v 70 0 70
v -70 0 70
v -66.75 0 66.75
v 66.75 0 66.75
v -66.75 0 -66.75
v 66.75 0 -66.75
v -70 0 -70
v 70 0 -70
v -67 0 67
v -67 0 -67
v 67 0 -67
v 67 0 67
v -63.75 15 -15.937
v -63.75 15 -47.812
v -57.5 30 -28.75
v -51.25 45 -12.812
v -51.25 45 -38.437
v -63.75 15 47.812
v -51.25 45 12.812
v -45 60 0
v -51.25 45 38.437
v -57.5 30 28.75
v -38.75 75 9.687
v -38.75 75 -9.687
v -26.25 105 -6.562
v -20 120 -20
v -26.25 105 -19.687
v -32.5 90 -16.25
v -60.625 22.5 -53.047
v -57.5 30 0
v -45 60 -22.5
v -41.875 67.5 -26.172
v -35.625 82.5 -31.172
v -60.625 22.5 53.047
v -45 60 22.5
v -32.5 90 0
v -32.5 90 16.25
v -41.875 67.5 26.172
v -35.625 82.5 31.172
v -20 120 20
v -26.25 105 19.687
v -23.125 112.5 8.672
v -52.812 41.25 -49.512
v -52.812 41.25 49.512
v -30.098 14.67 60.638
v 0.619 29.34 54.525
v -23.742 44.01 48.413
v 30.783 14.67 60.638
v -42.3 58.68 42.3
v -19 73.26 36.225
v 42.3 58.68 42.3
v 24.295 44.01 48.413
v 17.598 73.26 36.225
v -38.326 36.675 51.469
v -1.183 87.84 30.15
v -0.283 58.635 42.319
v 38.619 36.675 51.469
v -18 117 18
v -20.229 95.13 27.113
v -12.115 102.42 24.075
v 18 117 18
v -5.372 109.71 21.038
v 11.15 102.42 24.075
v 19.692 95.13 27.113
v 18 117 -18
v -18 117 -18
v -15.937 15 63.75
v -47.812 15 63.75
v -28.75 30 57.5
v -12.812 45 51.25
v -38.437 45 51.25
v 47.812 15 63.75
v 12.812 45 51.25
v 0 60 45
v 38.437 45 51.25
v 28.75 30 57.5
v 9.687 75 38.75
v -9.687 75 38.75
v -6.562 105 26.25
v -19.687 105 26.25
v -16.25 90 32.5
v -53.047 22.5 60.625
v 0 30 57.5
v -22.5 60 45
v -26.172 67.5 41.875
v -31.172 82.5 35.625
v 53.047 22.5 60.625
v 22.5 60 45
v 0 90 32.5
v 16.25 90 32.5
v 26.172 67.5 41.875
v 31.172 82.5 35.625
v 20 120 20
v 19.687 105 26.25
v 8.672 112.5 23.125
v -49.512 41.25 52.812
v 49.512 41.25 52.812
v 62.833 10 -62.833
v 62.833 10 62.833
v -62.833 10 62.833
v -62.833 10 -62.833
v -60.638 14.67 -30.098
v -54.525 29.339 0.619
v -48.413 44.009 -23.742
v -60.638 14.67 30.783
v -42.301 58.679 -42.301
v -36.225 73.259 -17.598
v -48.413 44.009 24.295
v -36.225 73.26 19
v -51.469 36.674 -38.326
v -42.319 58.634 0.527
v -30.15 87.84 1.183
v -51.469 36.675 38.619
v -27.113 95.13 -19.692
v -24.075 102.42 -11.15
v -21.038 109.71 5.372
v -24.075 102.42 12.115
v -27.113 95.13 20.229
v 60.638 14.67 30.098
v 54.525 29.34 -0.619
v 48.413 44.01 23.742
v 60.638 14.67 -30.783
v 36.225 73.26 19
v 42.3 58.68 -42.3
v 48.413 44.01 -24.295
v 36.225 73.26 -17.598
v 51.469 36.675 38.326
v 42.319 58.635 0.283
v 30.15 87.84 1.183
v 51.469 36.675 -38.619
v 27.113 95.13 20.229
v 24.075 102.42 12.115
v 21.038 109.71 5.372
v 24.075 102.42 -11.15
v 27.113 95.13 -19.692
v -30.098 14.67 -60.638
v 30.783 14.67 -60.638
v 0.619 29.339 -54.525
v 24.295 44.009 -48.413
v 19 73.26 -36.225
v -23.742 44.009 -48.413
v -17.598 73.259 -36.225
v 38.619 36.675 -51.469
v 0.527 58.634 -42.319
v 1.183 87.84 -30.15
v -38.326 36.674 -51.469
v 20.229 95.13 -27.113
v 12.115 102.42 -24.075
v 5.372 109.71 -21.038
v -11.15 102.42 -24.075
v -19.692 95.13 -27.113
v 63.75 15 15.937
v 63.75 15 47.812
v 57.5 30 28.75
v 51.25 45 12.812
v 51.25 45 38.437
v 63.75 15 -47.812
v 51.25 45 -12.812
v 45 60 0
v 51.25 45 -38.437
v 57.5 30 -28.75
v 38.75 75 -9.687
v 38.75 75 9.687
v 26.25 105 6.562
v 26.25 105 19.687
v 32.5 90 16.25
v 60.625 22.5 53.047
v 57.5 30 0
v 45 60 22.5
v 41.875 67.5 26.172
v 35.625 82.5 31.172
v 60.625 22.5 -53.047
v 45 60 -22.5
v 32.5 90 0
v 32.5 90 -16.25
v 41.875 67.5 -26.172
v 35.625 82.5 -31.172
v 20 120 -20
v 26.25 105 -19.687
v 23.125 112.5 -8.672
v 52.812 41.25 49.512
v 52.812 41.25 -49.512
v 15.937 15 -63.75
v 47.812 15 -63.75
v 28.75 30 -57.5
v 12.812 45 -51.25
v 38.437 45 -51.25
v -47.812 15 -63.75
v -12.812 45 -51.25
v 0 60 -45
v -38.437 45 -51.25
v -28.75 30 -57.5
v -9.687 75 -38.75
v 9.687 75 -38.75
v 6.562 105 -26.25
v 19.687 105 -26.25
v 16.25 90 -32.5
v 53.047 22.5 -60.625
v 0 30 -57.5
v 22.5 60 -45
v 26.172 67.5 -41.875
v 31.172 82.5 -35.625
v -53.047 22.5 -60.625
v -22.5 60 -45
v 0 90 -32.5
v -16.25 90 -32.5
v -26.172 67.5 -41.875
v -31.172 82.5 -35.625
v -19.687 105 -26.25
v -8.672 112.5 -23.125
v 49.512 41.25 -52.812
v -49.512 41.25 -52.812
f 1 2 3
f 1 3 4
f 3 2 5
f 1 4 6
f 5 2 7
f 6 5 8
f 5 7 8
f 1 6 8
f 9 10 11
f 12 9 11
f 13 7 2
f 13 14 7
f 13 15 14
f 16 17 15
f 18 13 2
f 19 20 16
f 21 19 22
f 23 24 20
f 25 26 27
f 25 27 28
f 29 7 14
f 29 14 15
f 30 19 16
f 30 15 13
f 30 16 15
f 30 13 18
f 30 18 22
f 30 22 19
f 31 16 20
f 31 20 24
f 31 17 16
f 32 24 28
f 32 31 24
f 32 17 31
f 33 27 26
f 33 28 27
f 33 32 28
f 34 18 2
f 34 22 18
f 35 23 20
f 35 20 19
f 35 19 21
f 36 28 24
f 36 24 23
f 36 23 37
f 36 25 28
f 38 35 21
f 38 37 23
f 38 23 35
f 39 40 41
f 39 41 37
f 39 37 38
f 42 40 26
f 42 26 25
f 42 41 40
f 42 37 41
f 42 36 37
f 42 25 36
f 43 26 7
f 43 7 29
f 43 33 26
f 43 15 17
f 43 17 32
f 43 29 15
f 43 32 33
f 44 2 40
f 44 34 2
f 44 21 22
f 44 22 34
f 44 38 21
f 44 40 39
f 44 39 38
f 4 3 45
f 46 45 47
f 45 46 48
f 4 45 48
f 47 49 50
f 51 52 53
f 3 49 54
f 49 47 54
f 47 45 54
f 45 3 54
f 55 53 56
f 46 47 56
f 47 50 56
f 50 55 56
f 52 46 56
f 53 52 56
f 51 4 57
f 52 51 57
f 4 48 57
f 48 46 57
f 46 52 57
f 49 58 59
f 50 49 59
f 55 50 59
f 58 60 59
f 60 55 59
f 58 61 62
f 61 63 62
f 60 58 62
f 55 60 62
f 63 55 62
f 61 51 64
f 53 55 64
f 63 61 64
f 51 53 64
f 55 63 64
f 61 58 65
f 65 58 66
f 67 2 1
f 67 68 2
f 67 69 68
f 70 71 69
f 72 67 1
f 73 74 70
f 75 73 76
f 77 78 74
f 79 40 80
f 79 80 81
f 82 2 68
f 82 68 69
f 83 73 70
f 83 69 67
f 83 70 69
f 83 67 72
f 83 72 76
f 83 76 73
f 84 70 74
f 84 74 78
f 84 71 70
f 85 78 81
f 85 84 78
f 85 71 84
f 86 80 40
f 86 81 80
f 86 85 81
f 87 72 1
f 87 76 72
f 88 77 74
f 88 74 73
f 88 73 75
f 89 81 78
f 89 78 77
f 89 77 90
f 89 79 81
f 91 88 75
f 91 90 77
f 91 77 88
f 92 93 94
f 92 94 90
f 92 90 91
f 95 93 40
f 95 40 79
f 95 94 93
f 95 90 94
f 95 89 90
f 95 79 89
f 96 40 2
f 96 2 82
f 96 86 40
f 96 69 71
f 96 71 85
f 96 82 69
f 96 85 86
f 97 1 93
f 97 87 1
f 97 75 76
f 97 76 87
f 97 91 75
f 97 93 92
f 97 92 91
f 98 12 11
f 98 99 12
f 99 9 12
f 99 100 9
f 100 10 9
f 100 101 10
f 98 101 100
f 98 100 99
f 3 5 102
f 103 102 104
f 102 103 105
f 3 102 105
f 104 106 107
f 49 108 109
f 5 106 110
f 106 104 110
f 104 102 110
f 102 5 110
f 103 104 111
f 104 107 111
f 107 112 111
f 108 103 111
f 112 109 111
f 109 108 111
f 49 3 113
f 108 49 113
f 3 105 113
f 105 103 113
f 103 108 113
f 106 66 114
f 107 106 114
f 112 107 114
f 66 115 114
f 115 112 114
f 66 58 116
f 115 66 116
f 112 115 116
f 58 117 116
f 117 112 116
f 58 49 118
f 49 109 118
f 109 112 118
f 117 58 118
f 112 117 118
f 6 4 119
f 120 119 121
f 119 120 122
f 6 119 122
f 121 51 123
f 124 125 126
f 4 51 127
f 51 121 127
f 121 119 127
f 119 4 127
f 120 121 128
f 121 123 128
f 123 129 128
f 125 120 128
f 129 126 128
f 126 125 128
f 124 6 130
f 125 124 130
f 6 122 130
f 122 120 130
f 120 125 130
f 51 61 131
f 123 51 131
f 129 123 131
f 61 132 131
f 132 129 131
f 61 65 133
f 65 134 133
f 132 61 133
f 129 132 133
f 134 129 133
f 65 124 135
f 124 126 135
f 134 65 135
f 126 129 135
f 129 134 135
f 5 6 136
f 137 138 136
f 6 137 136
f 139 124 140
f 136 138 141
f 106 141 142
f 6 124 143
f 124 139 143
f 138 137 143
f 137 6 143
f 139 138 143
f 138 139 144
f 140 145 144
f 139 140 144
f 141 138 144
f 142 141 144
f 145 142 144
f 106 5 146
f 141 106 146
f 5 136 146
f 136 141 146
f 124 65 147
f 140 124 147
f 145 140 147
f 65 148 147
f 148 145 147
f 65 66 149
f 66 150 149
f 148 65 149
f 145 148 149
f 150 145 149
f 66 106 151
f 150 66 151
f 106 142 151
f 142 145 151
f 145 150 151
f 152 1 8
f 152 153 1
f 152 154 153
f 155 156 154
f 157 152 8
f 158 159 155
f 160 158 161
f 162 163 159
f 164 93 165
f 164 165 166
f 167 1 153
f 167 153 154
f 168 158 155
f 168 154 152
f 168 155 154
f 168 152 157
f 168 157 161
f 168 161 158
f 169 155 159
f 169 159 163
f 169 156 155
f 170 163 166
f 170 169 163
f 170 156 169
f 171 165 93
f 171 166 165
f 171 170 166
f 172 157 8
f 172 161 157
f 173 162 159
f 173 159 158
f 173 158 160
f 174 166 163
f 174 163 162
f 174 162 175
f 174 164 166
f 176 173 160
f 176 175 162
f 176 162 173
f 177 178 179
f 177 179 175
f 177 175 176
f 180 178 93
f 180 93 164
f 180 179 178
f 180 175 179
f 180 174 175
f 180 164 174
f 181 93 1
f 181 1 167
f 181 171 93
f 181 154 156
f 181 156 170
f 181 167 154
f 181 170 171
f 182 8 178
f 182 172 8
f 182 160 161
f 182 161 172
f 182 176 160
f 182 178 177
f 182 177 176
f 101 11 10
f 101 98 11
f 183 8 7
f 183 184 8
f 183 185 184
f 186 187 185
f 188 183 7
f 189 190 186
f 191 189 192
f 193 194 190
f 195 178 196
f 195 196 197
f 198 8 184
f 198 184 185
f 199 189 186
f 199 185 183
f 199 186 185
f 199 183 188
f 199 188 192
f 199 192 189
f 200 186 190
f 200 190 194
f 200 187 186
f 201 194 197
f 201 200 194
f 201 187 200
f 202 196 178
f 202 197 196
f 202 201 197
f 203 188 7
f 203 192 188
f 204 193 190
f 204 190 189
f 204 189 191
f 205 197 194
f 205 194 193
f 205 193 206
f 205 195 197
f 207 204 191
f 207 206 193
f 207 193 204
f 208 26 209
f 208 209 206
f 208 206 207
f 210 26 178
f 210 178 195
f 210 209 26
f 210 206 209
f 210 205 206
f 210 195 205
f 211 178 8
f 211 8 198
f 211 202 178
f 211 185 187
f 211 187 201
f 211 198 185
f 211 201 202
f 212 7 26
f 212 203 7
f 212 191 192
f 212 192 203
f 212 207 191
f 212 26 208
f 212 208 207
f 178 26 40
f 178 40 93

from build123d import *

# Parameters (mm, degrees)
SKETCH_1_W         = 140
SKETCH_1_H         = 140
EXTRUDE_1_DEPTH    = 120
EXTRUDE_1_TAPER    = 22.61986495
SHELL_1_T          = -3
SKETCH_000000000_W = 134
SKETCH_000000000_H = 134
EXTRUDE_2_DEPTH    = 10
EXTRUDE_2_TAPER    = 22.61986495


with BuildPart() as part:
    # 草图1 → 凸台-拉伸1 (new body)
    with BuildSketch(Plane(origin=(0, 0, 0), x_dir=(1, 0, 0), z_dir=(0, 1, 0))):
        Rectangle(SKETCH_1_W, SKETCH_1_H)
    extrude(amount=EXTRUDE_1_DEPTH, taper=EXTRUDE_1_TAPER)

    # 抽壳1
    shell_1_openings = [part.faces().sort_by_distance(p)[0] for p in [
        (0, 0, 0),
    ]]
    offset(amount=SHELL_1_T, openings=shell_1_openings, kind=Kind.INTERSECTION)


with BuildPart() as body_2:
    # 000000000 → 凸台-拉伸2 (new body)
    with BuildSketch(Plane(origin=(0, 0, 0), x_dir=(1, 0, 0), z_dir=(0, 1, 0))):
        Rectangle(SKETCH_000000000_W, SKETCH_000000000_H)
    extrude(amount=EXTRUDE_2_DEPTH, taper=EXTRUDE_2_TAPER)


solid = Compound([part.part, body_2.part])
